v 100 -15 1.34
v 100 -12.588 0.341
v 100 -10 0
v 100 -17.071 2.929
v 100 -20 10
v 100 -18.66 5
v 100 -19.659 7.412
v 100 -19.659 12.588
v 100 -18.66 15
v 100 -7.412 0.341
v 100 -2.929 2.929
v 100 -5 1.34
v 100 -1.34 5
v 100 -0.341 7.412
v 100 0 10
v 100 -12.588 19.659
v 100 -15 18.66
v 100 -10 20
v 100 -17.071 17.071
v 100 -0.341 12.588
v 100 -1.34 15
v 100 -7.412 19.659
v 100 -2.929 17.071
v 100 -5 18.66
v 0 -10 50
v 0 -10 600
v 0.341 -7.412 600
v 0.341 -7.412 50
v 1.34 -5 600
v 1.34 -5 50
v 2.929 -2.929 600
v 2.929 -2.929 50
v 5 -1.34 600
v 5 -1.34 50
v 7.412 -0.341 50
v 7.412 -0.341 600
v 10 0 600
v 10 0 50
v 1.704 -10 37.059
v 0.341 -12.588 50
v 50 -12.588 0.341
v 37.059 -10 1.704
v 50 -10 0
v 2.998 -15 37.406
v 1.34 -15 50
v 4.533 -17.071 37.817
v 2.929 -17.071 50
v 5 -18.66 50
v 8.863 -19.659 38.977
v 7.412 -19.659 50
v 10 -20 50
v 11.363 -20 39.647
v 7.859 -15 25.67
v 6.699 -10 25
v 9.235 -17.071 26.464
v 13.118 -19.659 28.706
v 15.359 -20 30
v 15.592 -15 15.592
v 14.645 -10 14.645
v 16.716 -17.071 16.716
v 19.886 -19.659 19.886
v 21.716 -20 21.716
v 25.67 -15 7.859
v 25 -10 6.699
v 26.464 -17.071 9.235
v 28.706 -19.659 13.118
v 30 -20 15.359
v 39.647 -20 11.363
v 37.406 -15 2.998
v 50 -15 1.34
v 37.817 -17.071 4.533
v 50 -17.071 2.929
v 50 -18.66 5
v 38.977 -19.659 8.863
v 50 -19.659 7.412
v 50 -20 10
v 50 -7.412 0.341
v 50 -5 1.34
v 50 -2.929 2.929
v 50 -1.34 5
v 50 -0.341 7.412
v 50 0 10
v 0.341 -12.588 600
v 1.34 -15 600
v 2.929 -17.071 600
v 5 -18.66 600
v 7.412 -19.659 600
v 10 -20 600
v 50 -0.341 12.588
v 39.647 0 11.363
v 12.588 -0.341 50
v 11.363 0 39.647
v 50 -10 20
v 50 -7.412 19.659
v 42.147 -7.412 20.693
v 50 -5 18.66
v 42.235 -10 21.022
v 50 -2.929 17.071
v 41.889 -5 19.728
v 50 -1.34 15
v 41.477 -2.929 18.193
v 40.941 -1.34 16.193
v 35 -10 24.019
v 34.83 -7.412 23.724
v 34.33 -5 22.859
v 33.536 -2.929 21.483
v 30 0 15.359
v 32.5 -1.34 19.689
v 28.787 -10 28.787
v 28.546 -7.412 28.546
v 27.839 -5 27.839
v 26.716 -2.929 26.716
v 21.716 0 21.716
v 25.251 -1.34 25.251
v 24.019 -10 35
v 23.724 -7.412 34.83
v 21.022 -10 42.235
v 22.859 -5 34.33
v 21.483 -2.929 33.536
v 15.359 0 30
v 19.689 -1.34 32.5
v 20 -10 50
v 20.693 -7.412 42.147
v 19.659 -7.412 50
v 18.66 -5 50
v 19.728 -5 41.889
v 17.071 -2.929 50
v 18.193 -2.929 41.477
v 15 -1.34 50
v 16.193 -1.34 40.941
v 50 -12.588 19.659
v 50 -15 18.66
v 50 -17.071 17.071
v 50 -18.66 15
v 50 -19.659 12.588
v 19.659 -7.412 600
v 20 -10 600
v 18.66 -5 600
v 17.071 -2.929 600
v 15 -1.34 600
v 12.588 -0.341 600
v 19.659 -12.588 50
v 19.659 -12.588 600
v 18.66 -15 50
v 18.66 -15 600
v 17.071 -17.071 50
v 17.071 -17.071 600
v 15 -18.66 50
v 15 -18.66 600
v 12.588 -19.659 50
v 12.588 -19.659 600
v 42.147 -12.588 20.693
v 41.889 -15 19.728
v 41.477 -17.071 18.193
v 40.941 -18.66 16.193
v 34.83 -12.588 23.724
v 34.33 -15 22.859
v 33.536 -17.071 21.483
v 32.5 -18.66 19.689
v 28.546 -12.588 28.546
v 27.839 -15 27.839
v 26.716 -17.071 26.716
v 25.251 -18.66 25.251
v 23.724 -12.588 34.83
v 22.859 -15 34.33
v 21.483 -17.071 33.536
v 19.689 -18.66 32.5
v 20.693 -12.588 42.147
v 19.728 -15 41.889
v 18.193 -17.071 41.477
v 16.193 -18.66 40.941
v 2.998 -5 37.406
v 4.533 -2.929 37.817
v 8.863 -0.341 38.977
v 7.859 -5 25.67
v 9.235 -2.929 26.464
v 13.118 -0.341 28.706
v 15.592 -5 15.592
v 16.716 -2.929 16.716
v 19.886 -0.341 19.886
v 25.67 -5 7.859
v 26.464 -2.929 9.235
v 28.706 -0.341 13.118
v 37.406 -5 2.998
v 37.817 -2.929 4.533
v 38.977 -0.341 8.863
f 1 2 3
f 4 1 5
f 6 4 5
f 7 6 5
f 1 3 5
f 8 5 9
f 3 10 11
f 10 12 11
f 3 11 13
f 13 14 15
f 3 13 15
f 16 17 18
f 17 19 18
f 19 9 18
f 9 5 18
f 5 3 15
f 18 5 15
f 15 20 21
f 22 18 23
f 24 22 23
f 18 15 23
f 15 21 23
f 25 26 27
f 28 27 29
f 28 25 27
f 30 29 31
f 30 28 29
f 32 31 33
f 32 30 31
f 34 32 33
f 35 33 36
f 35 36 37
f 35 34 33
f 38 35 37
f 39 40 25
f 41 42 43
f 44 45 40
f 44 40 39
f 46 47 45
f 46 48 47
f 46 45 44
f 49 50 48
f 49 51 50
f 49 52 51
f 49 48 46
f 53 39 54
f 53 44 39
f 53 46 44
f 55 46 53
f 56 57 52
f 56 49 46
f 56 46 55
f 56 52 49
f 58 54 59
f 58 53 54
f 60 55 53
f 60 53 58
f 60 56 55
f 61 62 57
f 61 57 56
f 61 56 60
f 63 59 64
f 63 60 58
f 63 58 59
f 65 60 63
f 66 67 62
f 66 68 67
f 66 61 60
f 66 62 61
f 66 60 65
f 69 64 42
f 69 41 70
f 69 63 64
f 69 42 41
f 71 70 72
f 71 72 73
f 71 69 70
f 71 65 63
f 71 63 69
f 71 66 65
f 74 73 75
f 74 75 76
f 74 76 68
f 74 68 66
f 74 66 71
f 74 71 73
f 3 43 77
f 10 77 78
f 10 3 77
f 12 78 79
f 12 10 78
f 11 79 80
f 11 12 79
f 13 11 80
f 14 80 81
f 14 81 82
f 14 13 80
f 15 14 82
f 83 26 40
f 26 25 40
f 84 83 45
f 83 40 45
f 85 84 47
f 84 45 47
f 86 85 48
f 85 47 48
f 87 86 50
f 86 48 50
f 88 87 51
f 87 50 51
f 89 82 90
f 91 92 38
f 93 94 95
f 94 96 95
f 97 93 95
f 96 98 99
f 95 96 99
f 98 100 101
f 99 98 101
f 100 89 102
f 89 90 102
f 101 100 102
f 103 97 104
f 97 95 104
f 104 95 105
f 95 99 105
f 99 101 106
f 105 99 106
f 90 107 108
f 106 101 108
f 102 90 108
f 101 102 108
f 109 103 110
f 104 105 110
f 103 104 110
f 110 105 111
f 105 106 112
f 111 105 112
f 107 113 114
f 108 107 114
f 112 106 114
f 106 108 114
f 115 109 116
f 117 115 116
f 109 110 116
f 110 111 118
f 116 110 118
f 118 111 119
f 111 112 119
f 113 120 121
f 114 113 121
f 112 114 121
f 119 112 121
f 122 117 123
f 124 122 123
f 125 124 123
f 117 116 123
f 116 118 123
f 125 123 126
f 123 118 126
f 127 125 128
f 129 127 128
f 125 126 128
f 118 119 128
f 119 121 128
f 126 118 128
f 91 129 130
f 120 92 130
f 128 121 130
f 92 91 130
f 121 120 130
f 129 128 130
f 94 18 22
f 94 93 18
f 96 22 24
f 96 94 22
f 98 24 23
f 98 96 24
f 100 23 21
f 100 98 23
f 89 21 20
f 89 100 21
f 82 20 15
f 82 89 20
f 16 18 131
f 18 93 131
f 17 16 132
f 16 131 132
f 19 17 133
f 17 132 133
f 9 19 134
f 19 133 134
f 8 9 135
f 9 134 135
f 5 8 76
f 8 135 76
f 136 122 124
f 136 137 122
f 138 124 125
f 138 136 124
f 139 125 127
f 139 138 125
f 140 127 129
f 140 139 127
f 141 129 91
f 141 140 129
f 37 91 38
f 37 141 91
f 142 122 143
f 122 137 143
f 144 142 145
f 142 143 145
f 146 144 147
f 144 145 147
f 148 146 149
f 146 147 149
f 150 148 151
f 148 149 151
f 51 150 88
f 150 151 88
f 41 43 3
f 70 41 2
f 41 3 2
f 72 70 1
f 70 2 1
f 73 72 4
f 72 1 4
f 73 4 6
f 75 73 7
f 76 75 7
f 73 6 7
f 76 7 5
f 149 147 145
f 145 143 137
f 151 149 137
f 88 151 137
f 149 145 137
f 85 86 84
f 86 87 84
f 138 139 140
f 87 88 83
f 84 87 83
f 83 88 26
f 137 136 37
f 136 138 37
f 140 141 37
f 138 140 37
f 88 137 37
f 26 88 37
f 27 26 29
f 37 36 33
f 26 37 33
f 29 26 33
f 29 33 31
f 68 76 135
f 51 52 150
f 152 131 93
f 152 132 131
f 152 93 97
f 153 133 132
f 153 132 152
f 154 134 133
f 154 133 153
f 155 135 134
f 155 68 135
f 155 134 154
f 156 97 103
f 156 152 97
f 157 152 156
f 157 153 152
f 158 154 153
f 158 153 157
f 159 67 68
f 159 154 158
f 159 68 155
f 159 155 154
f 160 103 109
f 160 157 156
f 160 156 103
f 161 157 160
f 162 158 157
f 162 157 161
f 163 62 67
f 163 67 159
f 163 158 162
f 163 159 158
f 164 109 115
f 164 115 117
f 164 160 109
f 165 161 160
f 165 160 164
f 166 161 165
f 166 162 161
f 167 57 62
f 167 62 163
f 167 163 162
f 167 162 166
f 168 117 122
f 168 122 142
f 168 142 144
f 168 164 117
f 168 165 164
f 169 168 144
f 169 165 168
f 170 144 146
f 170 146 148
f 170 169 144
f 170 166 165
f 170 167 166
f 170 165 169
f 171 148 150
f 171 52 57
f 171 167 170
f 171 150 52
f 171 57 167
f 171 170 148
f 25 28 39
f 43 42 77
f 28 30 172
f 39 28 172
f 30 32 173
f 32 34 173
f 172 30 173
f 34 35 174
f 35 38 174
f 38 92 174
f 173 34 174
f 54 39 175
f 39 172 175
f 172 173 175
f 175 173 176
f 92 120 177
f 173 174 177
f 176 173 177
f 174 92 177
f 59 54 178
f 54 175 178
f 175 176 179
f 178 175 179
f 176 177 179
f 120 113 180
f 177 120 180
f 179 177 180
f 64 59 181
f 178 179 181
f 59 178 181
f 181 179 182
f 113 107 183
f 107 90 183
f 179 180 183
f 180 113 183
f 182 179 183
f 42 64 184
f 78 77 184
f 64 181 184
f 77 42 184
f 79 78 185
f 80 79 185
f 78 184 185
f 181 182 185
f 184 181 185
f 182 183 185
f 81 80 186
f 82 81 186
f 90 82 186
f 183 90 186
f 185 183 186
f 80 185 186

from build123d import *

# Parameters (mm, degrees)
F1_DEPTH = 20
F2_R     = 9.99999


# Not quite as in the source:
# - a fillet or chamfer is up to 0.001 mm smaller than in the source, because OpenCascade refuses the exact size


with BuildPart() as f1:
    # F0 (on Front) → F1 (new body)
    with BuildSketch(Plane.XZ):
        with BuildLine():
            Line((0, 600), (0, 50))
            ThreePointArc((0, 50), (14.6446609407, 14.6446609407), (50, 0))
            Line((50, 0), (100, 0))
            Line((100, 0), (100, 20))
            Line((100, 20), (50, 20))
            ThreePointArc((50, 20), (28.7867965644, 28.7867965644), (20, 50))
            Line((20, 50), (20, 600))
            Line((20, 600), (0, 600))
        make_face()
    extrude(amount=F1_DEPTH)

    # F2 (radius 10 in the source; OpenCascade refuses exactly that, so slightly less here)
    f2_edges = [f1.edges().sort_by_distance(p)[0] for p in [
        (0, -20, 325),
        (20, -20, 325),
        (20, 0, 325),
        (0, 0, 325),
    ]]
    fillet(f2_edges, radius=F2_R)


solid = f1.part
